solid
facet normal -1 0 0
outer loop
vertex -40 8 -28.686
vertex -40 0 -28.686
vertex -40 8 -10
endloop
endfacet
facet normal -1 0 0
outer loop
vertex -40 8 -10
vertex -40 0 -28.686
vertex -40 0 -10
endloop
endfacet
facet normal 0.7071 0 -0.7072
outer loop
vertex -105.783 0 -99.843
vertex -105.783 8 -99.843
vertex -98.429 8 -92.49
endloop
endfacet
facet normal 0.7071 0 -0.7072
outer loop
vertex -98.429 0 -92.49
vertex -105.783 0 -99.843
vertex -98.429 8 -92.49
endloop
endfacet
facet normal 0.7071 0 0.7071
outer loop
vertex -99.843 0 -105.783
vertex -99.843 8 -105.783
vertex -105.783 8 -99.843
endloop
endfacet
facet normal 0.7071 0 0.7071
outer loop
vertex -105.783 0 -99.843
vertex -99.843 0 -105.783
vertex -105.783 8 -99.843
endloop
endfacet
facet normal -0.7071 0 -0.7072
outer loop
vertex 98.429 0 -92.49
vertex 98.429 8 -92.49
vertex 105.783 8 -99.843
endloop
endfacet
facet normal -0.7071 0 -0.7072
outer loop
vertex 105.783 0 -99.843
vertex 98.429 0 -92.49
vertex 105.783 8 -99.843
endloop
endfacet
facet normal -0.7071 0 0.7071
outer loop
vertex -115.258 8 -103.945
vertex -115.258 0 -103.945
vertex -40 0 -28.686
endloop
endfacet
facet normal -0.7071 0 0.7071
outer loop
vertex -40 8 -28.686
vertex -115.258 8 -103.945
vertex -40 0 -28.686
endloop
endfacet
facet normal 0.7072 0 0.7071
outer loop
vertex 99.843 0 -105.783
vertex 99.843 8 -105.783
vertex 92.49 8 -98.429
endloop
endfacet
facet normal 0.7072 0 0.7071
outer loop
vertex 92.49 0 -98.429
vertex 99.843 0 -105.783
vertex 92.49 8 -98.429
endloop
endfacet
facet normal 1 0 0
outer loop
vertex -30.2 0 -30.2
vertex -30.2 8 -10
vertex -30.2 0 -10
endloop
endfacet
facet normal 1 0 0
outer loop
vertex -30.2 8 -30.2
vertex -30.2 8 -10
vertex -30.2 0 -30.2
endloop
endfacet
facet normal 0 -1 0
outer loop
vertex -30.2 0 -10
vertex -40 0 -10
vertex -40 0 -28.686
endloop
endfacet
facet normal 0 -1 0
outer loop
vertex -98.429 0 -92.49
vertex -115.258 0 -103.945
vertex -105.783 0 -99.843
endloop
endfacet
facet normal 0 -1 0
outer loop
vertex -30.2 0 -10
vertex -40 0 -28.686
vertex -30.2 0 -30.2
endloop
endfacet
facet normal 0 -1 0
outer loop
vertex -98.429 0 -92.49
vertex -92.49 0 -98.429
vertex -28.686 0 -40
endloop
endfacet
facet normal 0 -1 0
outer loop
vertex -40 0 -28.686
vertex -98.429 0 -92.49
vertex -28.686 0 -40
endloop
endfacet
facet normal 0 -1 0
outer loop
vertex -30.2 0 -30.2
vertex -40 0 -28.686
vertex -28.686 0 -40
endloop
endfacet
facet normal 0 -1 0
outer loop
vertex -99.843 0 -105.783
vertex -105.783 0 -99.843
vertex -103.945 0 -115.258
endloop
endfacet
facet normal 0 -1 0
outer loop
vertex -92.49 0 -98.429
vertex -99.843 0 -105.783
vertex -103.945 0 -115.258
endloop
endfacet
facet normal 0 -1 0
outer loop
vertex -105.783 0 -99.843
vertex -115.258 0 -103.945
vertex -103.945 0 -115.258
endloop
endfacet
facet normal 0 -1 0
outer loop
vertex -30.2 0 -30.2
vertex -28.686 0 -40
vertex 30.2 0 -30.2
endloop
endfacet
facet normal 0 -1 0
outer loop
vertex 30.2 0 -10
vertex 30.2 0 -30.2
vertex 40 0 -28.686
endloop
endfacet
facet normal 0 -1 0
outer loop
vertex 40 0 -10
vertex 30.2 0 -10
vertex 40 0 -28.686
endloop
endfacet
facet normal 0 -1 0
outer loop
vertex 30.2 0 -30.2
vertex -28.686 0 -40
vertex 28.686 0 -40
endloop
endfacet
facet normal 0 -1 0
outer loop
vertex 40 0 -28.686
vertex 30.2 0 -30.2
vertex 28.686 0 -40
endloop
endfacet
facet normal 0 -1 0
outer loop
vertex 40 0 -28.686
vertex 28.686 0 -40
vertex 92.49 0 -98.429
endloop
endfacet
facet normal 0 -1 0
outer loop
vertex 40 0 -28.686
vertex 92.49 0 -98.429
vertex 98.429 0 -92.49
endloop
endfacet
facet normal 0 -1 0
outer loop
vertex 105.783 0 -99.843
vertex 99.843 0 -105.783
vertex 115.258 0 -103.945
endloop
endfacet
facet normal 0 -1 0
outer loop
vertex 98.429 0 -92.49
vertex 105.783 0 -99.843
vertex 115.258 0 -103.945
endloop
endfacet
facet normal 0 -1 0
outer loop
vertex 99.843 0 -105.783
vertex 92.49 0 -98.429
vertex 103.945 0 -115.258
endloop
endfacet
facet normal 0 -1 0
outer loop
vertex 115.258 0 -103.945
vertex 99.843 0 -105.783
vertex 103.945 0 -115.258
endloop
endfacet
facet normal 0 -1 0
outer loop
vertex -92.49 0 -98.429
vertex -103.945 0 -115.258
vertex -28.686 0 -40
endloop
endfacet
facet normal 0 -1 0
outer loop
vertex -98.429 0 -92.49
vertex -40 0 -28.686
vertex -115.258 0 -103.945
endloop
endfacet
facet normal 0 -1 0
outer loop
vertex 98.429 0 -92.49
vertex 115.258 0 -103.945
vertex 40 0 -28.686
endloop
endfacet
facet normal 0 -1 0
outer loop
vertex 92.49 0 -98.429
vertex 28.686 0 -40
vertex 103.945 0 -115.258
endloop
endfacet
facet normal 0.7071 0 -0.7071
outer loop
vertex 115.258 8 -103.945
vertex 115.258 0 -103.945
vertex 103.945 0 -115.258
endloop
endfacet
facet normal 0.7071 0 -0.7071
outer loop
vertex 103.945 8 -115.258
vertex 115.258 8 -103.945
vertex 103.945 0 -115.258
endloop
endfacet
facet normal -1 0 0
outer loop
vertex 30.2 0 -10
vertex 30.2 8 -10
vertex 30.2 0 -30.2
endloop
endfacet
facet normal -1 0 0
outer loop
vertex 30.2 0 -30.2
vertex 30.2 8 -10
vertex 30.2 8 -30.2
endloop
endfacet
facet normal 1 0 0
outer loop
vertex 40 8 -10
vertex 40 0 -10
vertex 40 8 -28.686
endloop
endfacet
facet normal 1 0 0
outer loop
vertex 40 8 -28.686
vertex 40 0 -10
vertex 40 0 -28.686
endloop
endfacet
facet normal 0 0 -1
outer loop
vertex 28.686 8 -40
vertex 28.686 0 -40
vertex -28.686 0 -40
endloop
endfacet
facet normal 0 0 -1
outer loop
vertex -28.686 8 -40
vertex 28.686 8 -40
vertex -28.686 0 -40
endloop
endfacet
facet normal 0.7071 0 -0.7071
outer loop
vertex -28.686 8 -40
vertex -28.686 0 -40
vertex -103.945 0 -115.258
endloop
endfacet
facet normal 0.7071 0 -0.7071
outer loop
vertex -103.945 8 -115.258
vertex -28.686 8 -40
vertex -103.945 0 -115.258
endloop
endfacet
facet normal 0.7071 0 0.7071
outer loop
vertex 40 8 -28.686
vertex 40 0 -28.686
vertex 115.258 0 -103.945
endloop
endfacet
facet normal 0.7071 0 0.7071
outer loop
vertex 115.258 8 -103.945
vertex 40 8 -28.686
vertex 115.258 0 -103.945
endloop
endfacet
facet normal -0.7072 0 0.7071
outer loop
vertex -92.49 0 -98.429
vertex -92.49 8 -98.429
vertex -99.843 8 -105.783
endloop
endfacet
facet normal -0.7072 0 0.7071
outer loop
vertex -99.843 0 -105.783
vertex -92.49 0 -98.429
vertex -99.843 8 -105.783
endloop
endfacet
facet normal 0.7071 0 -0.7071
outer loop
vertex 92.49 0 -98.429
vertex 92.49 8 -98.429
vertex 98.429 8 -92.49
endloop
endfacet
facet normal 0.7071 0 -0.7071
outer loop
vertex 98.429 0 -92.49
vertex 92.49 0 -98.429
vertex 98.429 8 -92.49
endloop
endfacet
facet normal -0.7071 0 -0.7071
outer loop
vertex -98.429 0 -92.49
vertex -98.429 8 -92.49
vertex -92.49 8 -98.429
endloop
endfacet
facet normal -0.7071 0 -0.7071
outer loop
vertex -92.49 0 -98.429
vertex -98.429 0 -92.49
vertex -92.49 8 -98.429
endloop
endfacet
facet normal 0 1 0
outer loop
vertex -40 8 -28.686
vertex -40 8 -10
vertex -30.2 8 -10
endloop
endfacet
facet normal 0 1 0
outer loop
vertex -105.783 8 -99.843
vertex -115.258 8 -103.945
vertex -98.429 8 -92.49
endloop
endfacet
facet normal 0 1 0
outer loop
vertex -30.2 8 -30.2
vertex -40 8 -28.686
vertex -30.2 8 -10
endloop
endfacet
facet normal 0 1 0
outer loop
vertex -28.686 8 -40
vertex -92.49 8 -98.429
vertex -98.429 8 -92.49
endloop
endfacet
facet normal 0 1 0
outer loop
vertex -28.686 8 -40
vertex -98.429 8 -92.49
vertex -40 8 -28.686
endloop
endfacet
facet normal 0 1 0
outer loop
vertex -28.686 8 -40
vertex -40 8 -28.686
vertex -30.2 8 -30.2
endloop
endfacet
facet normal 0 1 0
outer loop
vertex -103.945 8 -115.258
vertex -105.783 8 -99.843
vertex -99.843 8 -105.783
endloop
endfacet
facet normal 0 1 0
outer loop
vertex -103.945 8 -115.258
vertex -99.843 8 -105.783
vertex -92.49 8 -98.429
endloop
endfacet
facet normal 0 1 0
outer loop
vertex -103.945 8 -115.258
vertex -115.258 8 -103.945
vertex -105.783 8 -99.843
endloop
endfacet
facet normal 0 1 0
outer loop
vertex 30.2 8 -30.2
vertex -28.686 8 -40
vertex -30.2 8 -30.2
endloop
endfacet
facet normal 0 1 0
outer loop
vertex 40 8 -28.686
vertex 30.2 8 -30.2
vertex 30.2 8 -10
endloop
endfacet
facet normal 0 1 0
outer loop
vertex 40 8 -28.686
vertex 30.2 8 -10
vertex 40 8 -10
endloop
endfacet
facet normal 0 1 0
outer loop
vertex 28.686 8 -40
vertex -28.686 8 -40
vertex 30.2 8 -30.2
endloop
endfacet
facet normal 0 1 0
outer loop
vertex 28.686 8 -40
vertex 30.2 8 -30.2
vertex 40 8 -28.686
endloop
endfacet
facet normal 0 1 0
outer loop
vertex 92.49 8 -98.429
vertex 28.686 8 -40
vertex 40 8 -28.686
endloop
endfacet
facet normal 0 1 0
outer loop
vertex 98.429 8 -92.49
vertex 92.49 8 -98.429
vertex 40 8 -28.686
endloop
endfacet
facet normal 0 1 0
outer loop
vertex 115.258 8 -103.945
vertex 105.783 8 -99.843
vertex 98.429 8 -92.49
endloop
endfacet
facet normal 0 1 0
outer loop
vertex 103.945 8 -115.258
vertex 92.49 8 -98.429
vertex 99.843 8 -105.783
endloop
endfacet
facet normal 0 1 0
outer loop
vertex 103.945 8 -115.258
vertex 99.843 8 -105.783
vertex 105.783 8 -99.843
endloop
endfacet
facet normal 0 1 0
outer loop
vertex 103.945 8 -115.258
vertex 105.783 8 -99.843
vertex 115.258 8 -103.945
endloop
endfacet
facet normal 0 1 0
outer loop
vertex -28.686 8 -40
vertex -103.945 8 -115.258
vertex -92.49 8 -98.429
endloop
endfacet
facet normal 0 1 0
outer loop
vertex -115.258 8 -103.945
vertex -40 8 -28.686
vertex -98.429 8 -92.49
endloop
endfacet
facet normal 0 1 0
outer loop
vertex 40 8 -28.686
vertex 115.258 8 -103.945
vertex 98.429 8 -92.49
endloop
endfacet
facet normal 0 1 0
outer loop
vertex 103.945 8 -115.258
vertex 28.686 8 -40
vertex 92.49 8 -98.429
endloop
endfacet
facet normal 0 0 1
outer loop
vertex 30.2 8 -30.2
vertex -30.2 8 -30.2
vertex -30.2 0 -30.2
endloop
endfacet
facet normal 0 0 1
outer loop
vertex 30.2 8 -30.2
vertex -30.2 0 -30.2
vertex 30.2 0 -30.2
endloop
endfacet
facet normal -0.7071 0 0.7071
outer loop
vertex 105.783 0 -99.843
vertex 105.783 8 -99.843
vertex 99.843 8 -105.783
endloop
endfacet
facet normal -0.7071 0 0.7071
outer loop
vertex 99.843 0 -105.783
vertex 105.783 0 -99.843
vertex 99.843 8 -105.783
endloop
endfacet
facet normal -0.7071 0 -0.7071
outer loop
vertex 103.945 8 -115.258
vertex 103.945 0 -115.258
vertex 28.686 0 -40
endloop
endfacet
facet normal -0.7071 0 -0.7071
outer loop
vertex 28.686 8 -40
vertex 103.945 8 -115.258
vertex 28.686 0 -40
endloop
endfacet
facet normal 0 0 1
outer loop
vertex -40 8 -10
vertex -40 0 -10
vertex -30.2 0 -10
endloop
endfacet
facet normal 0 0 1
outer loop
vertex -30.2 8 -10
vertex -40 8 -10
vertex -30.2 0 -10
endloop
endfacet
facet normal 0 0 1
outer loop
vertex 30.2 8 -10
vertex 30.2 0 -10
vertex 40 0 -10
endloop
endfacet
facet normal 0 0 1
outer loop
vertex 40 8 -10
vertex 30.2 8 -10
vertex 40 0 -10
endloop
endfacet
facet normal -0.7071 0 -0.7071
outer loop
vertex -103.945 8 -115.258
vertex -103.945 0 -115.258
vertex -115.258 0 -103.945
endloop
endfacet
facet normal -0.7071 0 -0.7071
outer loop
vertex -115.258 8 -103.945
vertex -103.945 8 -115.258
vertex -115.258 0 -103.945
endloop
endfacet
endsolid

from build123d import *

# Parameters (mm, degrees)
EXTRUDE_1_DEPTH     = 8
CUT_EXTRUDE_1_DEPTH = 164.196200936
SKETCH_6_W          = 60.4
SKETCH_6_H          = 60.4
CUT_EXTRUDE_2_DEPTH = 164.196200936


with BuildPart() as part:
    # 草图2 → 凸台-拉伸1 (new body)
    with BuildSketch(Plane(origin=(0, 0, 0), x_dir=(1, 0, 0), z_dir=(0, 1, 0))):
        Polygon((-40, 28.686291501), (-40, 40), (-28.686291501, 40), (-103.944696834, 115.258405333), (-115.258405333, 103.944696834), align=None)
        Polygon((103.944696834, 115.258405333), (28.686291501, 40), (40, 40), (40, 28.686291501), (115.258405333, 103.944696834), align=None)
        Polygon((40, 10), (40, 40), (-40, 40), (-40, 10), (-30, 10), (-30, 30), (30, 30), (30, 10), align=None)
    extrude(amount=EXTRUDE_1_DEPTH)

    # 草图5 → 切除-拉伸1 (cut, through all)
    with BuildSketch(Plane(origin=(0, 8, 0), x_dir=(1, 0, 0), z_dir=(0, 1, 0))):
        Polygon((-105.783174466, 99.843477504), (-98.429263941, 92.489566979), (-92.489566979, 98.429263941), (-99.843477504, 105.783174466), align=None)
        Polygon((92.489566979, 98.429263941), (98.429263941, 92.489566979), (105.783174466, 99.843477504), (99.843477504, 105.783174466), align=None)
    extrude(amount=-CUT_EXTRUDE_1_DEPTH, mode=Mode.SUBTRACT)

    # 草图6 → 切除-拉伸2 (cut, through all)
    with BuildSketch(Plane(origin=(0, 8, 0), x_dir=(1, 0, 0), z_dir=(0, 1, 0))):
        Rectangle(SKETCH_6_W, SKETCH_6_H)
    extrude(amount=-CUT_EXTRUDE_2_DEPTH, mode=Mode.SUBTRACT)


solid = part.part
